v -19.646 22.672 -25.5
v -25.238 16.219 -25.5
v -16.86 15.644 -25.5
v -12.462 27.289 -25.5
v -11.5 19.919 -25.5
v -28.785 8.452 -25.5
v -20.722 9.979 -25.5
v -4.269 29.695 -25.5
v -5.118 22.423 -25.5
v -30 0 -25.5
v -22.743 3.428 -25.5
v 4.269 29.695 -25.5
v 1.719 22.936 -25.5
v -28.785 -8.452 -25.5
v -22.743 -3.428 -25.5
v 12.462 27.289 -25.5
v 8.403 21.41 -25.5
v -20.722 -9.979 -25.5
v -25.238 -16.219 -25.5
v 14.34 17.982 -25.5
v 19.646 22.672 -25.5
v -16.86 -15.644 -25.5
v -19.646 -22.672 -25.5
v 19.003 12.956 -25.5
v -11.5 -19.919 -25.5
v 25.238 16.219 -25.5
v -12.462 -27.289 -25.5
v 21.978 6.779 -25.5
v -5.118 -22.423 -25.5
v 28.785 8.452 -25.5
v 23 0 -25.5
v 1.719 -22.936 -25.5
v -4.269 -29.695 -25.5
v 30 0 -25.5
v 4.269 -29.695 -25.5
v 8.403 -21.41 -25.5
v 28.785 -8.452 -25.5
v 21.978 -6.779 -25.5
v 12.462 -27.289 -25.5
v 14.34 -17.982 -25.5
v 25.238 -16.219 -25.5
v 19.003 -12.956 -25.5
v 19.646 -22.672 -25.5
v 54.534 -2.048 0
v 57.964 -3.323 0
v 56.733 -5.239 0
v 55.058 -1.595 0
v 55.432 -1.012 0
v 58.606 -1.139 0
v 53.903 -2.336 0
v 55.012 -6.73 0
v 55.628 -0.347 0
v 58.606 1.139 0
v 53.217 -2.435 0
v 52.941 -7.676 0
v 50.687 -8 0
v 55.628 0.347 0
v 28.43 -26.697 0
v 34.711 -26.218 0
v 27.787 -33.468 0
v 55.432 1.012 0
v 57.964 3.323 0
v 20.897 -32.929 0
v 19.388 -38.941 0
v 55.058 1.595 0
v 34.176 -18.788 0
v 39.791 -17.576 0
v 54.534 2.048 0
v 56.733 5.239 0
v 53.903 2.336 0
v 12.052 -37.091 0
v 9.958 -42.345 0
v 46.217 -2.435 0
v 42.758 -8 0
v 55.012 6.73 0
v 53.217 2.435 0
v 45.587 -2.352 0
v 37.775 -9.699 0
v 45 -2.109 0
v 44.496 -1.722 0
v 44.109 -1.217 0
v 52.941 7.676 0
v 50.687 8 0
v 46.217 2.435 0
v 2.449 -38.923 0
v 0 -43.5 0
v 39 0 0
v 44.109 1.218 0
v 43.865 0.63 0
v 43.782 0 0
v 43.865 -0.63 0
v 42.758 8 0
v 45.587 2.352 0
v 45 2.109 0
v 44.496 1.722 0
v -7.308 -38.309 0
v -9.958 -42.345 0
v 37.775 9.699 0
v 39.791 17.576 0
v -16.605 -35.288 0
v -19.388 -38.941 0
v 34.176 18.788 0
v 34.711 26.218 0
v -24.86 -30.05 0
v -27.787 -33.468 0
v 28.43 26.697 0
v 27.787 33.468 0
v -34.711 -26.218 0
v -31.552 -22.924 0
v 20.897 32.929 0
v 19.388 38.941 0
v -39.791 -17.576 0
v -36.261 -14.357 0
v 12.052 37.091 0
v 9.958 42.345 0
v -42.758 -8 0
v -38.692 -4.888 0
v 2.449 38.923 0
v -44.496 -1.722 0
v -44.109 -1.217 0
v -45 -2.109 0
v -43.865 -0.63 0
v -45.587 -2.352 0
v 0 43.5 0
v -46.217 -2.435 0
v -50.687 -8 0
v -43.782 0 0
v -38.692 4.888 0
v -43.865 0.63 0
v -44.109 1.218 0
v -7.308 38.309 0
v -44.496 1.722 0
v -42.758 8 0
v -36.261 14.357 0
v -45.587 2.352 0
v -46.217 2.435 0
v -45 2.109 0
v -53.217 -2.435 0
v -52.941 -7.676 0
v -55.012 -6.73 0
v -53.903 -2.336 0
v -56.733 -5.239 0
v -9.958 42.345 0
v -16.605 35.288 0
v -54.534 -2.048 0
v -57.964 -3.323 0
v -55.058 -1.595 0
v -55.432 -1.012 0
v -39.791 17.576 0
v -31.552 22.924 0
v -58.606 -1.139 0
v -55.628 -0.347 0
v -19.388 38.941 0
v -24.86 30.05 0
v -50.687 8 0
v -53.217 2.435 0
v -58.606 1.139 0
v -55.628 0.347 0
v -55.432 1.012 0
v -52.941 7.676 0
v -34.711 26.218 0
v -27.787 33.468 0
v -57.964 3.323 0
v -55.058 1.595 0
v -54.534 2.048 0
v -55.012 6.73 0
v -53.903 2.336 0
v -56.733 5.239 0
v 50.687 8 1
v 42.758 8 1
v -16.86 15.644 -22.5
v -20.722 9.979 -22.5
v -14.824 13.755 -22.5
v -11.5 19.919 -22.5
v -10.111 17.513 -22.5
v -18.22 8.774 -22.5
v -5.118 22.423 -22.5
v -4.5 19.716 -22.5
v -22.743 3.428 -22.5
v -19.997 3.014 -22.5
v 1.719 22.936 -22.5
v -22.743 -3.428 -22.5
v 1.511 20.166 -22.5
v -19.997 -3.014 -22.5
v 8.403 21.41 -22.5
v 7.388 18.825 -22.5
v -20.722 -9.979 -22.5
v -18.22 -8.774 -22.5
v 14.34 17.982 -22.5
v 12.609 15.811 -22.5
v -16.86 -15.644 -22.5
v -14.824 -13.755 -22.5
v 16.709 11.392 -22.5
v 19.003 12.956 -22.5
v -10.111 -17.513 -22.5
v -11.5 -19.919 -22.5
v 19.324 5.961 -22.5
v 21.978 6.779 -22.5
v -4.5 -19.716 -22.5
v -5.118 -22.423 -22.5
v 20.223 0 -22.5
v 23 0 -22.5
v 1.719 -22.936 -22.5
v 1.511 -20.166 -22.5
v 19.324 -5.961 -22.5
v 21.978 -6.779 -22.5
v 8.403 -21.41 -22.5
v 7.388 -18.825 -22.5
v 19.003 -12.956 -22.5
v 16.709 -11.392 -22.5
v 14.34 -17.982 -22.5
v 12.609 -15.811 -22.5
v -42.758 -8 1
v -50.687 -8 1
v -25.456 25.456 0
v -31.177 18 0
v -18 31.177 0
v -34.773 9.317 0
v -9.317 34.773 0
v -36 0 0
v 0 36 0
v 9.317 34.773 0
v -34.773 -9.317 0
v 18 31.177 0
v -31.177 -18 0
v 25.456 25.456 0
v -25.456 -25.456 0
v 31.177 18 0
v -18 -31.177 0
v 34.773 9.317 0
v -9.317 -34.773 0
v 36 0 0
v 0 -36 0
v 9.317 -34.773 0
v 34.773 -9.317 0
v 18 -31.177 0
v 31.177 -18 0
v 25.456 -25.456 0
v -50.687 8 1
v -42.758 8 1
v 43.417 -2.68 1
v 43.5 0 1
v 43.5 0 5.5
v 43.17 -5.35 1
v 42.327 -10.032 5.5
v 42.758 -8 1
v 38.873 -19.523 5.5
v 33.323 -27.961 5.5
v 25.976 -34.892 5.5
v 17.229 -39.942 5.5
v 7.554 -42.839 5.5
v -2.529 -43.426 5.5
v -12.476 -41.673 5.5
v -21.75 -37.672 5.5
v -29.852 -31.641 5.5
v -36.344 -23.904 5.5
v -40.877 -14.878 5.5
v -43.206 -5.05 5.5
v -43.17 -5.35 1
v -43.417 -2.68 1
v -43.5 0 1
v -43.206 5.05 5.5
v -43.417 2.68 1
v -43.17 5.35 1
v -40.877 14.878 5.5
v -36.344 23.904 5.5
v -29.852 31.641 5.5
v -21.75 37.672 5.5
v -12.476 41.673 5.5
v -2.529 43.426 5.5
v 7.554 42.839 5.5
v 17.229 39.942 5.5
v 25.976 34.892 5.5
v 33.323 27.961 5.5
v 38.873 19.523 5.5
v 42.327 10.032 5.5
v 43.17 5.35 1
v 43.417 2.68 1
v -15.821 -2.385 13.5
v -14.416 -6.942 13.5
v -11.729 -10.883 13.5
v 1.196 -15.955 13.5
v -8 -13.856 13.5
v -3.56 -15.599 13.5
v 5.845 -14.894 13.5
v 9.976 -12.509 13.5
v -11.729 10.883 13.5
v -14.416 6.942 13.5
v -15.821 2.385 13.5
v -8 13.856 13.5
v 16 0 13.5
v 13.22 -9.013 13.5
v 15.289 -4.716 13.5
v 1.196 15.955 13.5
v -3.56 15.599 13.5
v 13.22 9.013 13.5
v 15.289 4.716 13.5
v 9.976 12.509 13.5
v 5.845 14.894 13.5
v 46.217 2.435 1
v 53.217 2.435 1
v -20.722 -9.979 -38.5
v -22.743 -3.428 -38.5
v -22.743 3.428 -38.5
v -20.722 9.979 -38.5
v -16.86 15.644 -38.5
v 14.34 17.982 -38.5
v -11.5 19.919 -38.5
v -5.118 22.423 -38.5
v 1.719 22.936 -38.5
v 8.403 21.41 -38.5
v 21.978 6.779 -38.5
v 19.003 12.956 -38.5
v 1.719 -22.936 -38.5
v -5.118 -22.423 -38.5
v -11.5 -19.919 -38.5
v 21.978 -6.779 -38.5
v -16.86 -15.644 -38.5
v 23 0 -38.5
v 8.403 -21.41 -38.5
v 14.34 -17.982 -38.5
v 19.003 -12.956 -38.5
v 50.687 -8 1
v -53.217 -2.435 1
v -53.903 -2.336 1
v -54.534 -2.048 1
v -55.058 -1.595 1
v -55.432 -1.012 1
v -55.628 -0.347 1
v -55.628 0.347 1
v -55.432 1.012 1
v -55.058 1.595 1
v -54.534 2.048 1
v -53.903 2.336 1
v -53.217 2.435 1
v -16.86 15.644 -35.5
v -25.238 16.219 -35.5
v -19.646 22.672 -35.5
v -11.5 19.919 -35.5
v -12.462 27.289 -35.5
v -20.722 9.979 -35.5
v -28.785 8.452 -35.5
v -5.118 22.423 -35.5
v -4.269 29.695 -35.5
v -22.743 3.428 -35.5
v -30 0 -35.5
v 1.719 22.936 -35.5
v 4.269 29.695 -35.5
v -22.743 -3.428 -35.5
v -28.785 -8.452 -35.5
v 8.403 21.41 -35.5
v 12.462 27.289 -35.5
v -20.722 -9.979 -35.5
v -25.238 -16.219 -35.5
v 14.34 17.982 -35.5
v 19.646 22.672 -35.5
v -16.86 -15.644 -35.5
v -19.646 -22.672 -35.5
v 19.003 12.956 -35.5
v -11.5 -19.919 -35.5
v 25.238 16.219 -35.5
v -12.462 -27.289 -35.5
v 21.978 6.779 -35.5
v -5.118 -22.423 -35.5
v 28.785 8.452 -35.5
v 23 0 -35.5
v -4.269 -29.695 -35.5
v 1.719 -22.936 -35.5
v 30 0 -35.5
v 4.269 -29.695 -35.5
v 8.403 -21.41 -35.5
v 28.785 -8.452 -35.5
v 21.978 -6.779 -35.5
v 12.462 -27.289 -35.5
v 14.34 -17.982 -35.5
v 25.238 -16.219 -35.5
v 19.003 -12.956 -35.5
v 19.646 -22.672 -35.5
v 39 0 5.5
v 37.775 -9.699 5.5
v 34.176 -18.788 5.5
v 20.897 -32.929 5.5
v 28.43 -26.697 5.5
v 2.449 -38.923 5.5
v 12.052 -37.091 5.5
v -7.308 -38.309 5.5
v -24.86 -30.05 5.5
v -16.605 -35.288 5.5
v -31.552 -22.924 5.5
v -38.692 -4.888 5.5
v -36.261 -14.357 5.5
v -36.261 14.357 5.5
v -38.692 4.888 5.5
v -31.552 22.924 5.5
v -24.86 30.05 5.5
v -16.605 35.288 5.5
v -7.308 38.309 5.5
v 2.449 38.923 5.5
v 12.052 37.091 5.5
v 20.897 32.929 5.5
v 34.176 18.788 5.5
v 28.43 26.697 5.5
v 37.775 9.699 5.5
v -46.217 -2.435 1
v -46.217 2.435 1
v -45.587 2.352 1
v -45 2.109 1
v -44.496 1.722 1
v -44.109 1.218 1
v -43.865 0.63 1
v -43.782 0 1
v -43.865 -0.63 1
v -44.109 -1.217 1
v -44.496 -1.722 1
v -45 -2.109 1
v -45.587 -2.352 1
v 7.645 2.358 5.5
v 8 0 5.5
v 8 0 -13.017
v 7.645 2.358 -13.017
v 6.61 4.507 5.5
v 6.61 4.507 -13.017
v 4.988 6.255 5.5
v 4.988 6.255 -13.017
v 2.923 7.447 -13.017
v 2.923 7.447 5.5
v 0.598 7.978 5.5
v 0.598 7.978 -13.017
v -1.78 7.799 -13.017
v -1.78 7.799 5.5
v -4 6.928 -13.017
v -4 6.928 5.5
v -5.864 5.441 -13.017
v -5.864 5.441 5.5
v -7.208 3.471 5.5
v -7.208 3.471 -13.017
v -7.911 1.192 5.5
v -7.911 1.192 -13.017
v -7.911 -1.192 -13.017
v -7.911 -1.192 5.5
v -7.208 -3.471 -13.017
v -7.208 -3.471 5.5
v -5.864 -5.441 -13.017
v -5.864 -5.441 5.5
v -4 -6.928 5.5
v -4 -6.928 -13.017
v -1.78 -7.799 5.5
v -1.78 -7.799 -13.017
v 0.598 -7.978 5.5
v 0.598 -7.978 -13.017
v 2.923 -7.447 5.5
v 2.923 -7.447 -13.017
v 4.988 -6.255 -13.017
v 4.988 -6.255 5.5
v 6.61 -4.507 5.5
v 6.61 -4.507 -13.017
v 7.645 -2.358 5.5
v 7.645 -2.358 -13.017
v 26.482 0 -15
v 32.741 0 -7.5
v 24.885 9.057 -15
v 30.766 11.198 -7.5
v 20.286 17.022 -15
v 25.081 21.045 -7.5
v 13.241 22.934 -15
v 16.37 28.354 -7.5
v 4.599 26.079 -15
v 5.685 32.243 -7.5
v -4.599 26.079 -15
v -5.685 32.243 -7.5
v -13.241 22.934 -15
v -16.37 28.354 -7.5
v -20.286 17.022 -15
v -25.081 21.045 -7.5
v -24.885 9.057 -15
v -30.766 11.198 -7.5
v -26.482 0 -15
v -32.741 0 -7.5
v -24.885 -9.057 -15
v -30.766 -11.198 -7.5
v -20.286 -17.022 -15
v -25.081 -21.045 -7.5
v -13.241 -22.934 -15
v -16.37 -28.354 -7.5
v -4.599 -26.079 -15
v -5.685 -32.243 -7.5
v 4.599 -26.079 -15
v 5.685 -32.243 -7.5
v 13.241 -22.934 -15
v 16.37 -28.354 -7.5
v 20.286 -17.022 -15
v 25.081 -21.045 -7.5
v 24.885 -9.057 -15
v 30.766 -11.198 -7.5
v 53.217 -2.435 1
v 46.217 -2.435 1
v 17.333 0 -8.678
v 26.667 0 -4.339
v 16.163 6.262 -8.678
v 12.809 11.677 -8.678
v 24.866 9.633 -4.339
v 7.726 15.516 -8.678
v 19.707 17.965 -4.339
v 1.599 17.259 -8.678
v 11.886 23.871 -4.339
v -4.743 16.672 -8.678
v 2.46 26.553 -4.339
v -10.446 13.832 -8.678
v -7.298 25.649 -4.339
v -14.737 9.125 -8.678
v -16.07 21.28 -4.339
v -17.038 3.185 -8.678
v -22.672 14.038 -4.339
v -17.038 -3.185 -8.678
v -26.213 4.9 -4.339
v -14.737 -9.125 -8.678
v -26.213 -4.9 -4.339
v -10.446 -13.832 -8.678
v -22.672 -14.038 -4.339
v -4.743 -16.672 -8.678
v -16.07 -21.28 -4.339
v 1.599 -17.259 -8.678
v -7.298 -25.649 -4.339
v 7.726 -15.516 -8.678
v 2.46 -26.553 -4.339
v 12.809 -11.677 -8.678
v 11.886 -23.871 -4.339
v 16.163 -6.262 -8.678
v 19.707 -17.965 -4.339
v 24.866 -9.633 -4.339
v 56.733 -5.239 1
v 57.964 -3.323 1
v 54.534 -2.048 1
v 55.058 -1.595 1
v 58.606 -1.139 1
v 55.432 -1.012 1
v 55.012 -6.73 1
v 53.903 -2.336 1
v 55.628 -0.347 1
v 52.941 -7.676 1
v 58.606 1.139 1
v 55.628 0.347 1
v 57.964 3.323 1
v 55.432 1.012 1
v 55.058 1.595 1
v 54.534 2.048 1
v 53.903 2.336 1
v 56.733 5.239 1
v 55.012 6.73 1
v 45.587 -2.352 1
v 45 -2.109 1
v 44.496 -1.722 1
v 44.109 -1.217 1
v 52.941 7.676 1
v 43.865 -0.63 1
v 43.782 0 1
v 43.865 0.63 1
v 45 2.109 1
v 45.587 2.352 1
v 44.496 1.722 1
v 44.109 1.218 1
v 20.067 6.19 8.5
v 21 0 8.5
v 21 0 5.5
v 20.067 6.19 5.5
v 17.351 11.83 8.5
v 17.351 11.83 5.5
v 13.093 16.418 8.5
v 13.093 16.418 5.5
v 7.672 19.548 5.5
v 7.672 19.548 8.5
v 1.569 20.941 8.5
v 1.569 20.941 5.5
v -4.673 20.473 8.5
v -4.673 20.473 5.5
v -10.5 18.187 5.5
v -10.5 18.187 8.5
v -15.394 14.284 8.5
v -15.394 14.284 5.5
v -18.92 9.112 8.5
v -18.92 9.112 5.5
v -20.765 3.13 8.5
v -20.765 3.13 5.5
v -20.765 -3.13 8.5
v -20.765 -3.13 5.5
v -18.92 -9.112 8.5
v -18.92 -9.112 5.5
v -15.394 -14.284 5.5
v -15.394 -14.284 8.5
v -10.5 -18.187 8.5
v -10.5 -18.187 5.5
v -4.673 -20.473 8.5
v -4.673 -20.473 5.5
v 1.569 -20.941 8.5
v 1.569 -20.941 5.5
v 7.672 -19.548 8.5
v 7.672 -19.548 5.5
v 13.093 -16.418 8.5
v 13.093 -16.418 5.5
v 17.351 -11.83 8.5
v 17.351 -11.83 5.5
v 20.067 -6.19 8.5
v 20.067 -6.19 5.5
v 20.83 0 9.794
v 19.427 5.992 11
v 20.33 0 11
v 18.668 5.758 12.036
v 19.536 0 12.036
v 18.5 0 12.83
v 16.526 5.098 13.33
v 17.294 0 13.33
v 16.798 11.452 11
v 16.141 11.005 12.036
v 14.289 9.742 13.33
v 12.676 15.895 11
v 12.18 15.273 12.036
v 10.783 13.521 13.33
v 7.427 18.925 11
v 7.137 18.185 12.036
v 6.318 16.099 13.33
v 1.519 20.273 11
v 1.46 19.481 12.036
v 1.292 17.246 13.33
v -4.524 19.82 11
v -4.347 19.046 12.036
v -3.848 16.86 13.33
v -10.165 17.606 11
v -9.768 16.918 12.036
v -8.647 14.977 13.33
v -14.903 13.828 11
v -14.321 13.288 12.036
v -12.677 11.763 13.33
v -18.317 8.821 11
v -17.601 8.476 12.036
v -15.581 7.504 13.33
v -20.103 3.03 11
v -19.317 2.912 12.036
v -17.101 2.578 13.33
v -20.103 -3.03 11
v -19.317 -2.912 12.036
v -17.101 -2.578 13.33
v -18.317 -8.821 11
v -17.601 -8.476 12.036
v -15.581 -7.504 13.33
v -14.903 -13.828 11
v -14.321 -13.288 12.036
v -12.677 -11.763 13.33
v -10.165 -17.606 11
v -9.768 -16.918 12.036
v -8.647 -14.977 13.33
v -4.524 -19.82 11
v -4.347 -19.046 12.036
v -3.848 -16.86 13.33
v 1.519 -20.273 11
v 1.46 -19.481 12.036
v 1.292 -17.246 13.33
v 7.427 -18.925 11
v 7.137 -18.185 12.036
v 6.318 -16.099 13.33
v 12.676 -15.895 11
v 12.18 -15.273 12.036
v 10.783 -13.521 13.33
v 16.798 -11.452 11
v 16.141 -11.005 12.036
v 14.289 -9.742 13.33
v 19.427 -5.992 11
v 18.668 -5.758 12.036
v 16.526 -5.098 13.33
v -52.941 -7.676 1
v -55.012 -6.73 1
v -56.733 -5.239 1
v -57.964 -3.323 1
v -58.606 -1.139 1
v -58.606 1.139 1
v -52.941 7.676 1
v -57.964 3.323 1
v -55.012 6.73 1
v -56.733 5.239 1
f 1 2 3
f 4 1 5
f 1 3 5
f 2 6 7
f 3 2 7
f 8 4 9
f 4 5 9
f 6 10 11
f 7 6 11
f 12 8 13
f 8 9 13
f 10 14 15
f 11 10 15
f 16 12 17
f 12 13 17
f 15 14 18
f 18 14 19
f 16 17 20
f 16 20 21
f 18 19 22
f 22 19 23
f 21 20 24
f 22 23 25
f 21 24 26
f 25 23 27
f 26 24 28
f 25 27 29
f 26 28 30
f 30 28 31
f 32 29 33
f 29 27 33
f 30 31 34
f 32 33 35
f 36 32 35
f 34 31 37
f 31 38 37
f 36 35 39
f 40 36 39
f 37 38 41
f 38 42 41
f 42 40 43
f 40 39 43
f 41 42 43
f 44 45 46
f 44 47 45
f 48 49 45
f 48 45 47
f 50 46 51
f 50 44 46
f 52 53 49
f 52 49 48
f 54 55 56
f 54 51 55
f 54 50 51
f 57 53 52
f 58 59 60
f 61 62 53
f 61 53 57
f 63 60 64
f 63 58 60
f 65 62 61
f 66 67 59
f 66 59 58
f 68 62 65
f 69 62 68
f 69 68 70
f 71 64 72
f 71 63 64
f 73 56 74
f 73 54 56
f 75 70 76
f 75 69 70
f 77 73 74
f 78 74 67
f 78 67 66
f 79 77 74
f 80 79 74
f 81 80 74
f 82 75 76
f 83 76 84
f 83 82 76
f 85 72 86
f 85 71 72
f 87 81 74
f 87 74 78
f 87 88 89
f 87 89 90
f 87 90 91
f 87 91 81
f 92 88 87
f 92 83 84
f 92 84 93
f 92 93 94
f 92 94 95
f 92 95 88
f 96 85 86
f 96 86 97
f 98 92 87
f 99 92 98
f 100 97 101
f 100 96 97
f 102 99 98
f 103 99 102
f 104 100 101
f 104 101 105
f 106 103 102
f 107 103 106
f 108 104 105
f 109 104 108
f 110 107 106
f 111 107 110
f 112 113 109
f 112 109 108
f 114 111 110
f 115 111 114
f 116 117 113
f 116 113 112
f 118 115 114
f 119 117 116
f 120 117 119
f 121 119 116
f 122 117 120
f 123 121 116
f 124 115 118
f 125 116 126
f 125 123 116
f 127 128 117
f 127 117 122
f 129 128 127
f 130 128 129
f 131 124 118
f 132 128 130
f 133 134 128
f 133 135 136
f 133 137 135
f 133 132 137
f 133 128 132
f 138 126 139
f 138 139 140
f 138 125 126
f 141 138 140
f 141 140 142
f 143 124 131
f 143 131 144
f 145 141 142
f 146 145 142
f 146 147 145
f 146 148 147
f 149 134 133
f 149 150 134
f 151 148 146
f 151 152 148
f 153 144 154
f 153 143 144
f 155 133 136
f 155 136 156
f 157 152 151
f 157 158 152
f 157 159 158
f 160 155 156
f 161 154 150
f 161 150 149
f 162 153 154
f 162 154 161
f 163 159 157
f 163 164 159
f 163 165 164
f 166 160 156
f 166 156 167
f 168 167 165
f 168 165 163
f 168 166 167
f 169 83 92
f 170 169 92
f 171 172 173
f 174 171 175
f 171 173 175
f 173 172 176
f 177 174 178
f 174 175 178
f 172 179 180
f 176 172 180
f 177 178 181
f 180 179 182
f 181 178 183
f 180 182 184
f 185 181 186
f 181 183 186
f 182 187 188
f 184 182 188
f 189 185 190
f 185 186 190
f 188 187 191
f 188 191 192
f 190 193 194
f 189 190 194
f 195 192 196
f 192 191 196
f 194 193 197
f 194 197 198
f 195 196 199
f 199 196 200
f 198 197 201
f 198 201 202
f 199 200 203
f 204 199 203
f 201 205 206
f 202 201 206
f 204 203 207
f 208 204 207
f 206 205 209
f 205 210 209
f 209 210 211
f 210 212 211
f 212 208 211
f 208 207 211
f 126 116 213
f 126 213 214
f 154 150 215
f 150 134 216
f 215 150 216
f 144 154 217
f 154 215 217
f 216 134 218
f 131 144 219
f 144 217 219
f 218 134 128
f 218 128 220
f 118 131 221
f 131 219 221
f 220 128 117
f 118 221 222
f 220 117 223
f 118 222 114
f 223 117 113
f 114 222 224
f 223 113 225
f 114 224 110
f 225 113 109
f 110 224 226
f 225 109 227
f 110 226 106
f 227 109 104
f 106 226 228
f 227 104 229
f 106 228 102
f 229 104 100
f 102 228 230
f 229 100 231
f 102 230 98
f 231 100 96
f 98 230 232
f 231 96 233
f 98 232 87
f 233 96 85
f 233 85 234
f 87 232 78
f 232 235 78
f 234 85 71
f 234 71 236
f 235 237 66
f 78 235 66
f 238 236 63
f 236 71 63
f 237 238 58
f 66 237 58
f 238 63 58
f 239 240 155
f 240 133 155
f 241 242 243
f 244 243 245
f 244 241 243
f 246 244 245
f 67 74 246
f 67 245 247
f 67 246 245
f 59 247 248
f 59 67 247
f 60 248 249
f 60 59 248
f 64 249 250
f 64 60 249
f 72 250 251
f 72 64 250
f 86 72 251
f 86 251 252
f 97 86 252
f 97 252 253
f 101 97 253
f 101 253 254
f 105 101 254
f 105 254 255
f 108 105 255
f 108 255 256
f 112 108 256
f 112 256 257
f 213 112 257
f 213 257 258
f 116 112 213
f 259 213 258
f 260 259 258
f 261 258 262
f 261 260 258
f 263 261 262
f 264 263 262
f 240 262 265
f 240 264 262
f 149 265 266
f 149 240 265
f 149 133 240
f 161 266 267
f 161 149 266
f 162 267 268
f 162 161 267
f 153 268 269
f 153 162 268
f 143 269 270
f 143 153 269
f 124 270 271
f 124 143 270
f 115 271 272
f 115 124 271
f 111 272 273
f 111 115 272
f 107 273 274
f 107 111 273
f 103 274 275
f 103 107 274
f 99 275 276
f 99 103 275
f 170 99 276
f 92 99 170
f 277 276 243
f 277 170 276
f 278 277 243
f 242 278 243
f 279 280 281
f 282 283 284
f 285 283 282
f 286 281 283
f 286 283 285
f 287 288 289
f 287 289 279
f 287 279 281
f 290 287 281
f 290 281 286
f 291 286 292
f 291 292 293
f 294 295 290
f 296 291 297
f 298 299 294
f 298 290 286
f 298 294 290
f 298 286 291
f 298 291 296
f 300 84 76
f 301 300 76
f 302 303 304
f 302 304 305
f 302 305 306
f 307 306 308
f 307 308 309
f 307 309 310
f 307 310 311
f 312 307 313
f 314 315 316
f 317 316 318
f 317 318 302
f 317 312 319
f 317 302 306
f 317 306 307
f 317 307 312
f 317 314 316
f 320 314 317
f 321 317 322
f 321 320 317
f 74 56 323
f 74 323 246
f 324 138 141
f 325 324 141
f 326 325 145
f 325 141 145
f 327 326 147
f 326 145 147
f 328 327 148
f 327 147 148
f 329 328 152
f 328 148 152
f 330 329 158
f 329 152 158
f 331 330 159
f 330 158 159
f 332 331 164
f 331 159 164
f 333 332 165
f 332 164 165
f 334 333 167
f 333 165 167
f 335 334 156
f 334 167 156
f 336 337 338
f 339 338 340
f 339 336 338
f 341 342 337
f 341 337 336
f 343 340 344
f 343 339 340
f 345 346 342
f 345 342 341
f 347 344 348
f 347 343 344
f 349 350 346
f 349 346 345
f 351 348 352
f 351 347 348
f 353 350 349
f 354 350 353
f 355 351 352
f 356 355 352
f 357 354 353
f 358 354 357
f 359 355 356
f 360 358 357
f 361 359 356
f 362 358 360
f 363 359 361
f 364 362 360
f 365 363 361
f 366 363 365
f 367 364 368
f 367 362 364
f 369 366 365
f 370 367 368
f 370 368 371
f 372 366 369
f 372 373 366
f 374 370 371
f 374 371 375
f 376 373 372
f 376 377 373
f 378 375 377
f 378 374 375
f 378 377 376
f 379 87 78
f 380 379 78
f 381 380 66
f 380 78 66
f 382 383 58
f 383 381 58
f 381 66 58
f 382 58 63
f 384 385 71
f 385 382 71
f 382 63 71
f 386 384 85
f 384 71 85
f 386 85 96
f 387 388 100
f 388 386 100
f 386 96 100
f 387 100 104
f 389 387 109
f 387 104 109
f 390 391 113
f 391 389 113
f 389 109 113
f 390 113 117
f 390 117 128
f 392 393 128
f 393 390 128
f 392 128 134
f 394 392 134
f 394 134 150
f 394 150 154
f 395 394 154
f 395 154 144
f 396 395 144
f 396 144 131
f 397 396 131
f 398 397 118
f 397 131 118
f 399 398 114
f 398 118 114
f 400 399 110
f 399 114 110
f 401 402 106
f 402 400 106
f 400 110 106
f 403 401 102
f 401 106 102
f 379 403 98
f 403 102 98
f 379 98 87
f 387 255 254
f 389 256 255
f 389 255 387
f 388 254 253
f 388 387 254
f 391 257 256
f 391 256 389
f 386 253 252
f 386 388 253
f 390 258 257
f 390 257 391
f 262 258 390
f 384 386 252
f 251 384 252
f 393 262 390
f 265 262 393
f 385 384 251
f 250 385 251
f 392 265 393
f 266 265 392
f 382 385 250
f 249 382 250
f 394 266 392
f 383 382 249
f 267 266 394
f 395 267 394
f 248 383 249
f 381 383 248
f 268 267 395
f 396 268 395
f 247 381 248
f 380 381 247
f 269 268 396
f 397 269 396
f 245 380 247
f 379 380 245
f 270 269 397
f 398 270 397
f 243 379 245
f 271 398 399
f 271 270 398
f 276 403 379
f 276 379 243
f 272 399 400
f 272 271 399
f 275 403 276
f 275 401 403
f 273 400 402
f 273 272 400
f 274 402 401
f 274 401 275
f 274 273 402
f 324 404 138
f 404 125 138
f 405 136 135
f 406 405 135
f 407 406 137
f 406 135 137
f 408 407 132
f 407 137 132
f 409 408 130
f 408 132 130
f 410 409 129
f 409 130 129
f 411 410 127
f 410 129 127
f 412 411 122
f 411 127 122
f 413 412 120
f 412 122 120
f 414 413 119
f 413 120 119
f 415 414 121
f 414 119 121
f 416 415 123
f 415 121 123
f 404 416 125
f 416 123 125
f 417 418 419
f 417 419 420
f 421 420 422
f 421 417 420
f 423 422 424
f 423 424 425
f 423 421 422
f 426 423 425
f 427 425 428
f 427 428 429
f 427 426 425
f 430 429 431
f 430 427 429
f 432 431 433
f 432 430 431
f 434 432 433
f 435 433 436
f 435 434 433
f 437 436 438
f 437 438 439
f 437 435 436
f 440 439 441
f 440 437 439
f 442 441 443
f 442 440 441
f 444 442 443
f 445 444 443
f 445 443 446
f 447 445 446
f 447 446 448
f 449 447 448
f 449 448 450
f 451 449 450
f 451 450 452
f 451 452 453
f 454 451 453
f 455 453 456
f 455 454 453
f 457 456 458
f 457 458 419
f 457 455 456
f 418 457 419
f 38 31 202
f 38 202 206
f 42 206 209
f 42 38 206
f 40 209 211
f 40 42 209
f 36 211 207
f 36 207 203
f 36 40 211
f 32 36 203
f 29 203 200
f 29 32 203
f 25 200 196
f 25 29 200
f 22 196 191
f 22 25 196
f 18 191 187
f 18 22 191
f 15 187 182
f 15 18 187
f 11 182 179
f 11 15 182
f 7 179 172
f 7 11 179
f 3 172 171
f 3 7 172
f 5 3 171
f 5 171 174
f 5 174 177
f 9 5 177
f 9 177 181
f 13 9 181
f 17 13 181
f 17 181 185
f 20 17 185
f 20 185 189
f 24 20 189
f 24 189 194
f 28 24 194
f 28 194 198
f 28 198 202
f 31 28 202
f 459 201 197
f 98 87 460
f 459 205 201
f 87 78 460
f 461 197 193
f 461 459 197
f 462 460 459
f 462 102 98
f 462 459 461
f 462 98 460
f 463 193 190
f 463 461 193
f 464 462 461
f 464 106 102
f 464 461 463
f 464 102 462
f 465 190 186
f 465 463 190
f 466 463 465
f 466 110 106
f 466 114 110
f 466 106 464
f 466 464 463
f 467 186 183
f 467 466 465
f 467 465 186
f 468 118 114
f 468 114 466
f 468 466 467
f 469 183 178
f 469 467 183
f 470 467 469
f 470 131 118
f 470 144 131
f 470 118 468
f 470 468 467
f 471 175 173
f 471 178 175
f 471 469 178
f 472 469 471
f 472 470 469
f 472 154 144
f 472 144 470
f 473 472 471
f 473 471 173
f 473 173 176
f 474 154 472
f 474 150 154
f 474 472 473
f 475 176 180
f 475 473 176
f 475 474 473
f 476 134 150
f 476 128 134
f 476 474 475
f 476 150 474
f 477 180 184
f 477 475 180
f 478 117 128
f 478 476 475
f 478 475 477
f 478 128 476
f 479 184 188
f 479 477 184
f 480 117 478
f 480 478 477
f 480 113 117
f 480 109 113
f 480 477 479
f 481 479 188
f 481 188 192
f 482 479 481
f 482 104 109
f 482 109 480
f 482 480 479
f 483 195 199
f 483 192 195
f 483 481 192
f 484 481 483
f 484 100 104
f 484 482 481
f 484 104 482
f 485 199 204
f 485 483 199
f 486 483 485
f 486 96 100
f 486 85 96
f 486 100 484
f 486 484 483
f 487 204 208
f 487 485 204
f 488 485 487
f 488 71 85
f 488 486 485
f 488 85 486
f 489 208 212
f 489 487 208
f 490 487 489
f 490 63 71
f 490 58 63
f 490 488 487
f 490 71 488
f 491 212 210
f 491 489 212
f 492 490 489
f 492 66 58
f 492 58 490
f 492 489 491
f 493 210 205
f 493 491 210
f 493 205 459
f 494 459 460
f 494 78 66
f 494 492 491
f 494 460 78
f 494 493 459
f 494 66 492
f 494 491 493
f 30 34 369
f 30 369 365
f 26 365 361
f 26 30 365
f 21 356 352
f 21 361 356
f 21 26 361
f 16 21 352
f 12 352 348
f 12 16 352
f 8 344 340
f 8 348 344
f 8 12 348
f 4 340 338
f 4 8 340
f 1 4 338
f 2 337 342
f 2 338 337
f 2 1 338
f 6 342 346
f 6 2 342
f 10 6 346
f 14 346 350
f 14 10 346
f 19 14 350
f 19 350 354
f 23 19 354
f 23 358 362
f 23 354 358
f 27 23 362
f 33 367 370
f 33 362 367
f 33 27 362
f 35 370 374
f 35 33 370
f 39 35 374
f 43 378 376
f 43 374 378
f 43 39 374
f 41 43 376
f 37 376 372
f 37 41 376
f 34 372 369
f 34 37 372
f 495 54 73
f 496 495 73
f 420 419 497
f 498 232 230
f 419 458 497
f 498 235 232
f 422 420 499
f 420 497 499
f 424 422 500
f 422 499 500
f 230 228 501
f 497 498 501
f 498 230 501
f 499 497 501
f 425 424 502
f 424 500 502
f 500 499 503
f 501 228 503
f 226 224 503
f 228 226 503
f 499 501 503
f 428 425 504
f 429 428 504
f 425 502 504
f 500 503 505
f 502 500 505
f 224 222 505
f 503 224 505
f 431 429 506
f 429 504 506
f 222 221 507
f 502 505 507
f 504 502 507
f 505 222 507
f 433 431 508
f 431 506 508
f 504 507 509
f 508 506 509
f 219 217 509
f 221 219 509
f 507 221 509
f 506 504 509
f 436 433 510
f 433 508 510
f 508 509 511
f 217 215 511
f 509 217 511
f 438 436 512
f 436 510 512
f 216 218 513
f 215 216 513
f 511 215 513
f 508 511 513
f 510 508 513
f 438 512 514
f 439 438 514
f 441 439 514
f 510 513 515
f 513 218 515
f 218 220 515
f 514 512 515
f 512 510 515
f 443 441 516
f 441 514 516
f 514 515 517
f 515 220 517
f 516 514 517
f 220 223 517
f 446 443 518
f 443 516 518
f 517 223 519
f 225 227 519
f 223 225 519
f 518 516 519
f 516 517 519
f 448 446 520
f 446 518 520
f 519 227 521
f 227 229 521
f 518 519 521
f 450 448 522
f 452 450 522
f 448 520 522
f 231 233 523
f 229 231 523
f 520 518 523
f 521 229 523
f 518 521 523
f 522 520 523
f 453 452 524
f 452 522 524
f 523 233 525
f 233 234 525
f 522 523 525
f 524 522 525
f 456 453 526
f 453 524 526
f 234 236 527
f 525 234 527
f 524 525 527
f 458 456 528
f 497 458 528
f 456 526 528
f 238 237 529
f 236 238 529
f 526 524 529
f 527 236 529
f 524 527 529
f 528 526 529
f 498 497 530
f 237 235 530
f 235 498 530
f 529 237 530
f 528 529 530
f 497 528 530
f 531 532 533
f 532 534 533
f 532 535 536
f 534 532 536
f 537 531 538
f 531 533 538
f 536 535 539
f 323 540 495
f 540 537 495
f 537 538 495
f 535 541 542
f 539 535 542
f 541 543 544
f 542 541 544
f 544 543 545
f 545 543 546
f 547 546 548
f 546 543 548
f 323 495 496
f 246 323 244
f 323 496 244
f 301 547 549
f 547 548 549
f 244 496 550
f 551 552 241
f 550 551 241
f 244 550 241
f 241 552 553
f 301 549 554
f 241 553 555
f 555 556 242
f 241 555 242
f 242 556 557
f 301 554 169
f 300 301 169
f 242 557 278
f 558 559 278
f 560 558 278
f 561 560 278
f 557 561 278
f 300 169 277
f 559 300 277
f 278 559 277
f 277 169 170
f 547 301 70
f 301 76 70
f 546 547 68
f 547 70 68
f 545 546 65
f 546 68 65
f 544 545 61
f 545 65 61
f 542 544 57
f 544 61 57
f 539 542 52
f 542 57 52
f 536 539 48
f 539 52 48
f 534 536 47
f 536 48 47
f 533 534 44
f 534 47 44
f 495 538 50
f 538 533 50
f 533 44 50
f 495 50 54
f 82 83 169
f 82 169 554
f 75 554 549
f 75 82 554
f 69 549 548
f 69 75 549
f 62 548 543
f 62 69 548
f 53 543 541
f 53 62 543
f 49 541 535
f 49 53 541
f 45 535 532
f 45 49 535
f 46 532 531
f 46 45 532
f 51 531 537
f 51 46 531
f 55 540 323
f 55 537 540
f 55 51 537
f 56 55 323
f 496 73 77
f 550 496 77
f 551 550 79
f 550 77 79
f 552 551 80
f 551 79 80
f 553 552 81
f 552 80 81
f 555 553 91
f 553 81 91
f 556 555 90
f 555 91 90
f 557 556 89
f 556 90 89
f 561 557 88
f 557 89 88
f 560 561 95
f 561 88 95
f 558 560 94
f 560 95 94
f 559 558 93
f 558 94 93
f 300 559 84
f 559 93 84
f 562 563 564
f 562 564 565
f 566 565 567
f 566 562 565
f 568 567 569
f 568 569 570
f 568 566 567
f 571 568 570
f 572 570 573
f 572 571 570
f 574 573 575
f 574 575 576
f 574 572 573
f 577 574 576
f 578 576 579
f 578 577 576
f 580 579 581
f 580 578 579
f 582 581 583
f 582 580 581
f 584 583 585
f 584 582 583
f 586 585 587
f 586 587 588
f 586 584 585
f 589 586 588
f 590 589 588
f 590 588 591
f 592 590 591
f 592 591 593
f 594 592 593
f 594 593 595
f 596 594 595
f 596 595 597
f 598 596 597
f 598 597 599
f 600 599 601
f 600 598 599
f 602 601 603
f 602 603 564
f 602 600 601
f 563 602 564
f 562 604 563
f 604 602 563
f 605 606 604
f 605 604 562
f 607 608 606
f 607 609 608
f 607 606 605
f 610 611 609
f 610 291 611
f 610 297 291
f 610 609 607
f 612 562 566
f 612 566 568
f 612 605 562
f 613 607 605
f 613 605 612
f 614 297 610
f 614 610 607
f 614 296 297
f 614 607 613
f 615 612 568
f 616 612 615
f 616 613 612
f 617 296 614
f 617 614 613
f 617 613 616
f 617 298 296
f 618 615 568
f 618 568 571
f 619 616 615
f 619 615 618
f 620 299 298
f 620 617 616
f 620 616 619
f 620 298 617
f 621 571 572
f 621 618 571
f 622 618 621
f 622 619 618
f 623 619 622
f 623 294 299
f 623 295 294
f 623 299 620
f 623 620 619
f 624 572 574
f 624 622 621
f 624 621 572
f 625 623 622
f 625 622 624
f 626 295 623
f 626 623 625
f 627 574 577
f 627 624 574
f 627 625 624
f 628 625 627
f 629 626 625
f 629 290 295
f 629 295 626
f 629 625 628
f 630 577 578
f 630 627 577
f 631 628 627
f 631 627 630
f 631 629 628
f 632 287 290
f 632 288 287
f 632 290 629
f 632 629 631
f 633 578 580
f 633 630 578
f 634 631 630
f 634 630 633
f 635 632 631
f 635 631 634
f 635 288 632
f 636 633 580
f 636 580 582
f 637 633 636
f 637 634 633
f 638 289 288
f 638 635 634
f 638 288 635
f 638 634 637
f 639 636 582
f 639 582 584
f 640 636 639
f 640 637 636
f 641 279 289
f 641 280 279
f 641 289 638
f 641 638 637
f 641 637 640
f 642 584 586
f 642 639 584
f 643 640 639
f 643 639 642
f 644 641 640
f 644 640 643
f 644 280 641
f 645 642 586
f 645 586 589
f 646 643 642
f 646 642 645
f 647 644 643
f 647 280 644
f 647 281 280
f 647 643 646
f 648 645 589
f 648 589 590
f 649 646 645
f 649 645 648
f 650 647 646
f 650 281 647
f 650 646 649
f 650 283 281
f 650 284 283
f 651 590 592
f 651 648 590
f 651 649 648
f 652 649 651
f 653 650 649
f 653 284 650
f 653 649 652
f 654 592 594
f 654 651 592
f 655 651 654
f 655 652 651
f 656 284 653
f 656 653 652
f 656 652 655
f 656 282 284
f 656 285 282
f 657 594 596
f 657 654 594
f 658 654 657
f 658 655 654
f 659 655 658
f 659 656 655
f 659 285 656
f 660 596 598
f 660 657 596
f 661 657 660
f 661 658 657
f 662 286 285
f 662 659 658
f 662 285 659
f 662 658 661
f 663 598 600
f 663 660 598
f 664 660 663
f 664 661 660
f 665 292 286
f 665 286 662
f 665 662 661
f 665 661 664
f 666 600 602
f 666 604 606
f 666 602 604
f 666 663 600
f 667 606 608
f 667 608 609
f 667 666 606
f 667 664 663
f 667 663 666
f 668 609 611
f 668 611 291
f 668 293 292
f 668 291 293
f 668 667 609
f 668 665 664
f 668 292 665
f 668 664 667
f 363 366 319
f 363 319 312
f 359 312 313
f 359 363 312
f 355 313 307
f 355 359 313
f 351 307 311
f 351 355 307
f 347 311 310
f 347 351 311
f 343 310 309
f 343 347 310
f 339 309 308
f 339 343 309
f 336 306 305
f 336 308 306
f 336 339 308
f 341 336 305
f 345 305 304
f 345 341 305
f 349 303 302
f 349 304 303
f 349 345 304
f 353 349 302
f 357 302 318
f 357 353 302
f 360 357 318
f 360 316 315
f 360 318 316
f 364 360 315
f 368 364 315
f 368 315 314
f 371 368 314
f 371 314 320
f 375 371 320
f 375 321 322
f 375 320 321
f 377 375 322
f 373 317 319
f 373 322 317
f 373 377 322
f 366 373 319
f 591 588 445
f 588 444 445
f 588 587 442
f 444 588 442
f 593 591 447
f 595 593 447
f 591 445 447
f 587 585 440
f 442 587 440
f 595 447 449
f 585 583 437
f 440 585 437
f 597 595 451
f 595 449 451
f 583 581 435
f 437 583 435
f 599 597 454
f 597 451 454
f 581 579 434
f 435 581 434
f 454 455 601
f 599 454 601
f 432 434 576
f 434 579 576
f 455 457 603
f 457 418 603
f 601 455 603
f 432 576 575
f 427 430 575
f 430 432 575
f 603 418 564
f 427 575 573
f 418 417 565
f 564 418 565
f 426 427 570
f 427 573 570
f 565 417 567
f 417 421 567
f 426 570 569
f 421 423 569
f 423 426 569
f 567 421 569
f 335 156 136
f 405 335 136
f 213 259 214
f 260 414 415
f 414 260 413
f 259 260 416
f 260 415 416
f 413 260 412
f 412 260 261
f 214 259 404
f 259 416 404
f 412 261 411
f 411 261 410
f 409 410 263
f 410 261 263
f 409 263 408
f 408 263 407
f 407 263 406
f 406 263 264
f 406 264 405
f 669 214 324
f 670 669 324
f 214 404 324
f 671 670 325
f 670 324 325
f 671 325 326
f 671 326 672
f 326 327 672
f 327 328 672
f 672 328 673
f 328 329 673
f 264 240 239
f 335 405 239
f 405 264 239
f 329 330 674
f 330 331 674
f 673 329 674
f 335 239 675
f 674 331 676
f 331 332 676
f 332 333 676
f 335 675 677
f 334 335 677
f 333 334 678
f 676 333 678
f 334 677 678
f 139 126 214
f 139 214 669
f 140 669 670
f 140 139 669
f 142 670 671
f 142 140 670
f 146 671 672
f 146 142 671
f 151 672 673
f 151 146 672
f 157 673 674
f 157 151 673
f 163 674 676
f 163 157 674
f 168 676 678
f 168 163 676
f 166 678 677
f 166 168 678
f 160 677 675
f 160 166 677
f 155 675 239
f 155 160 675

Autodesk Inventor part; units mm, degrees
ref_plane "YZ Plane" through (0, 0, 0) normal (1, 0, 0) x (0, 1, 0)
ref_plane "XZ Plane" through (0, 0, 0) normal (0, 1, 0) x (-1, 0, 0)
ref_plane "XY Plane" through (0, 0, 0) normal (0, 0, 1) x (1, 0, 0)
sketch "Sketch1" plane through (0, 0, 0) normal (0, 0, 1) x (1, 0, 0)
  circle A0 centre (0, 0) radius 43.5
  circle A1 centre (0, 0) radius 39
  dimension "d0" = 87
  dimension "d1" = 78
extrude "Extrusion1" add sketch "Sketch1" along normal blind 5.5
sketch "Sketch2" plane through (0, 0, 0) normal (0, 1, 0) x (-1, 0, 0)
  line L0 (43.5, 5.5) -> (-43.5, 5.5) projected
  line L1 (-43.5, 0) -> (43.5, 0) projected
  line L2 (43.5, 0) -> (43.5, 5.5) projected
  line L3 (-43.5, 0) -> (-43.5, 5.5) projected
  line L4 (0, -1.1) -> (0, 6.6) construction
  line L5 (0, 0) -> (0, -38.5) construction
  line L6 (0, -38.5) -> (-30, -38.5)
  line L7 (-30, -38.5) -> (-30, -22.5)
  line L8 (-30, -22.5) -> (0, -22.5)
  line L9 (0, -22.5) -> (0, -38.5)
  line L10 (-30, -22.5) -> (-23, -22.5)
  line L11 (-23, -22.5) -> (-23, -25.5)
  line L12 (-23, -25.5) -> (-30, -25.5)
  line L13 (-30, -25.5) -> (-30, -22.5)
  line L14 (-30, -38.5) -> (-23, -38.5)
  line L15 (-23, -38.5) -> (-23, -35.5)
  line L16 (-23, -35.5) -> (-30, -35.5)
  line L17 (-30, -35.5) -> (-30, -38.5)
  line L18 (-39, 0) -> (-39, 5.5) projected
  line L19 (-39, 0) -> (-36, 0)
  line L20 (-43.5, 0) -> (43.5, 0) projected
  line L21 (-36, 0) -> (0, -16.7363)
  line L22 (0, -16.7363) -> (0, -22.5)
  line L23 (-39, 0) -> (-20.2226, -22.5)
  dimension "d4" = 38.5
  dimension "d5" = 30
  dimension "d6" = 16
  dimension "d7" = 7
  dimension "d8" = 3
  dimension "d9" = 7
  dimension "d10" = 3
  dimension "d11" = 3
revolve "Revolution1" add sketch "Sketch2" angle 360 about axis through (0, 0, 0) along (0, 0, -1) contours L1 L21 L22 L8 L23 | L8 L9 L6 L15 L16 L7 L12 L11
sketch "Sketch3" plane through (0, 0, 0) normal (0, 1, 0) x (-1, 0, 0)
  line L0 (0, -47.3) -> (0, 14.3) construction
  line L1 (30, -35.5) -> (-30, -35.5) projected
  line L2 (-30, -25.5) -> (30, -25.5) projected
  line L3 (-30, -25.5) -> (30, -25.5) projected
  line L4 (0, -25.5) -> (-8, -25.5)
  line L5 (-8, -25.5) -> (-8, 5.5)
  line L6 (-8, 5.5) -> (0, 5.5)
  line L7 (0, 5.5) -> (0, -25.5)
  line L8 (0, 5.5) -> (-21, 5.5)
  line L9 (-21, 5.5) -> (-21, 13.5)
  line L10 (-21, 13.5) -> (0, 13.5)
  line L11 (0, 13.5) -> (0, 5.5)
  point P0 (0, 0)
  dimension "d13" = 8
  dimension "d14" = 31
  dimension "d15" = 21
  dimension "d16" = 8
revolve "Revolution2" add sketch "Sketch3" angle 360 about axis through (0, 0, -10) along (0, 0, 1)
sketch "Sketch4" plane through (0, 0, 0) normal (0, 0, -1) x (-1, 0, 0)
  circle A0 centre (0, 0) radius 43.5 projected
  line L0 (60.9, 0) -> (-60.9, 0) construction
  line L1 (0, -60.9) -> (0, 60.9) construction
  line L2 (52, 0) -> (-52, 0)
  line L3 (46.2174, 0) -> (53.2174, 0) construction
  line L4 (46.2174, -2.435) -> (53.2174, -2.435)
  line L5 (53.2174, 2.435) -> (46.2174, 2.435)
  arc A1 (46.2174, 2.435) -> (46.2174, -2.435) centre (46.2174, 0) ccw
  arc A2 (53.2174, -2.435) -> (53.2174, 2.435) centre (53.2174, 0) ccw
  circle A3 centre (0, 0) radius 43.5 projected
  line L6 (42.758, -8) -> (50.6871, -8)
  line L7 (42.758, 8) -> (50.6871, 8)
  arc A4 (50.6871, -8) -> (50.6871, 8) centre (50.6871, 0) ccw
  point P0 (49.7174, 0)
  dimension "d18" = 104
  dimension "d19" = 3.5
  dimension "d20" = 4.87
  dimension "d21" = 8
  dimension "d22" = 8
extrude "Extrusion2" add sketch "Sketch4" against normal blind 1 contours A0 L7 A4 L6
mirror "Mirror1" about plane through (0, 0, 0) normal (1, 0, 0) of "Extrusion2"
fillet "Fillet1" radius 5 1 edges at (-21, 0, 13.5)
properties part number "Speaker_Massive_MX3"
